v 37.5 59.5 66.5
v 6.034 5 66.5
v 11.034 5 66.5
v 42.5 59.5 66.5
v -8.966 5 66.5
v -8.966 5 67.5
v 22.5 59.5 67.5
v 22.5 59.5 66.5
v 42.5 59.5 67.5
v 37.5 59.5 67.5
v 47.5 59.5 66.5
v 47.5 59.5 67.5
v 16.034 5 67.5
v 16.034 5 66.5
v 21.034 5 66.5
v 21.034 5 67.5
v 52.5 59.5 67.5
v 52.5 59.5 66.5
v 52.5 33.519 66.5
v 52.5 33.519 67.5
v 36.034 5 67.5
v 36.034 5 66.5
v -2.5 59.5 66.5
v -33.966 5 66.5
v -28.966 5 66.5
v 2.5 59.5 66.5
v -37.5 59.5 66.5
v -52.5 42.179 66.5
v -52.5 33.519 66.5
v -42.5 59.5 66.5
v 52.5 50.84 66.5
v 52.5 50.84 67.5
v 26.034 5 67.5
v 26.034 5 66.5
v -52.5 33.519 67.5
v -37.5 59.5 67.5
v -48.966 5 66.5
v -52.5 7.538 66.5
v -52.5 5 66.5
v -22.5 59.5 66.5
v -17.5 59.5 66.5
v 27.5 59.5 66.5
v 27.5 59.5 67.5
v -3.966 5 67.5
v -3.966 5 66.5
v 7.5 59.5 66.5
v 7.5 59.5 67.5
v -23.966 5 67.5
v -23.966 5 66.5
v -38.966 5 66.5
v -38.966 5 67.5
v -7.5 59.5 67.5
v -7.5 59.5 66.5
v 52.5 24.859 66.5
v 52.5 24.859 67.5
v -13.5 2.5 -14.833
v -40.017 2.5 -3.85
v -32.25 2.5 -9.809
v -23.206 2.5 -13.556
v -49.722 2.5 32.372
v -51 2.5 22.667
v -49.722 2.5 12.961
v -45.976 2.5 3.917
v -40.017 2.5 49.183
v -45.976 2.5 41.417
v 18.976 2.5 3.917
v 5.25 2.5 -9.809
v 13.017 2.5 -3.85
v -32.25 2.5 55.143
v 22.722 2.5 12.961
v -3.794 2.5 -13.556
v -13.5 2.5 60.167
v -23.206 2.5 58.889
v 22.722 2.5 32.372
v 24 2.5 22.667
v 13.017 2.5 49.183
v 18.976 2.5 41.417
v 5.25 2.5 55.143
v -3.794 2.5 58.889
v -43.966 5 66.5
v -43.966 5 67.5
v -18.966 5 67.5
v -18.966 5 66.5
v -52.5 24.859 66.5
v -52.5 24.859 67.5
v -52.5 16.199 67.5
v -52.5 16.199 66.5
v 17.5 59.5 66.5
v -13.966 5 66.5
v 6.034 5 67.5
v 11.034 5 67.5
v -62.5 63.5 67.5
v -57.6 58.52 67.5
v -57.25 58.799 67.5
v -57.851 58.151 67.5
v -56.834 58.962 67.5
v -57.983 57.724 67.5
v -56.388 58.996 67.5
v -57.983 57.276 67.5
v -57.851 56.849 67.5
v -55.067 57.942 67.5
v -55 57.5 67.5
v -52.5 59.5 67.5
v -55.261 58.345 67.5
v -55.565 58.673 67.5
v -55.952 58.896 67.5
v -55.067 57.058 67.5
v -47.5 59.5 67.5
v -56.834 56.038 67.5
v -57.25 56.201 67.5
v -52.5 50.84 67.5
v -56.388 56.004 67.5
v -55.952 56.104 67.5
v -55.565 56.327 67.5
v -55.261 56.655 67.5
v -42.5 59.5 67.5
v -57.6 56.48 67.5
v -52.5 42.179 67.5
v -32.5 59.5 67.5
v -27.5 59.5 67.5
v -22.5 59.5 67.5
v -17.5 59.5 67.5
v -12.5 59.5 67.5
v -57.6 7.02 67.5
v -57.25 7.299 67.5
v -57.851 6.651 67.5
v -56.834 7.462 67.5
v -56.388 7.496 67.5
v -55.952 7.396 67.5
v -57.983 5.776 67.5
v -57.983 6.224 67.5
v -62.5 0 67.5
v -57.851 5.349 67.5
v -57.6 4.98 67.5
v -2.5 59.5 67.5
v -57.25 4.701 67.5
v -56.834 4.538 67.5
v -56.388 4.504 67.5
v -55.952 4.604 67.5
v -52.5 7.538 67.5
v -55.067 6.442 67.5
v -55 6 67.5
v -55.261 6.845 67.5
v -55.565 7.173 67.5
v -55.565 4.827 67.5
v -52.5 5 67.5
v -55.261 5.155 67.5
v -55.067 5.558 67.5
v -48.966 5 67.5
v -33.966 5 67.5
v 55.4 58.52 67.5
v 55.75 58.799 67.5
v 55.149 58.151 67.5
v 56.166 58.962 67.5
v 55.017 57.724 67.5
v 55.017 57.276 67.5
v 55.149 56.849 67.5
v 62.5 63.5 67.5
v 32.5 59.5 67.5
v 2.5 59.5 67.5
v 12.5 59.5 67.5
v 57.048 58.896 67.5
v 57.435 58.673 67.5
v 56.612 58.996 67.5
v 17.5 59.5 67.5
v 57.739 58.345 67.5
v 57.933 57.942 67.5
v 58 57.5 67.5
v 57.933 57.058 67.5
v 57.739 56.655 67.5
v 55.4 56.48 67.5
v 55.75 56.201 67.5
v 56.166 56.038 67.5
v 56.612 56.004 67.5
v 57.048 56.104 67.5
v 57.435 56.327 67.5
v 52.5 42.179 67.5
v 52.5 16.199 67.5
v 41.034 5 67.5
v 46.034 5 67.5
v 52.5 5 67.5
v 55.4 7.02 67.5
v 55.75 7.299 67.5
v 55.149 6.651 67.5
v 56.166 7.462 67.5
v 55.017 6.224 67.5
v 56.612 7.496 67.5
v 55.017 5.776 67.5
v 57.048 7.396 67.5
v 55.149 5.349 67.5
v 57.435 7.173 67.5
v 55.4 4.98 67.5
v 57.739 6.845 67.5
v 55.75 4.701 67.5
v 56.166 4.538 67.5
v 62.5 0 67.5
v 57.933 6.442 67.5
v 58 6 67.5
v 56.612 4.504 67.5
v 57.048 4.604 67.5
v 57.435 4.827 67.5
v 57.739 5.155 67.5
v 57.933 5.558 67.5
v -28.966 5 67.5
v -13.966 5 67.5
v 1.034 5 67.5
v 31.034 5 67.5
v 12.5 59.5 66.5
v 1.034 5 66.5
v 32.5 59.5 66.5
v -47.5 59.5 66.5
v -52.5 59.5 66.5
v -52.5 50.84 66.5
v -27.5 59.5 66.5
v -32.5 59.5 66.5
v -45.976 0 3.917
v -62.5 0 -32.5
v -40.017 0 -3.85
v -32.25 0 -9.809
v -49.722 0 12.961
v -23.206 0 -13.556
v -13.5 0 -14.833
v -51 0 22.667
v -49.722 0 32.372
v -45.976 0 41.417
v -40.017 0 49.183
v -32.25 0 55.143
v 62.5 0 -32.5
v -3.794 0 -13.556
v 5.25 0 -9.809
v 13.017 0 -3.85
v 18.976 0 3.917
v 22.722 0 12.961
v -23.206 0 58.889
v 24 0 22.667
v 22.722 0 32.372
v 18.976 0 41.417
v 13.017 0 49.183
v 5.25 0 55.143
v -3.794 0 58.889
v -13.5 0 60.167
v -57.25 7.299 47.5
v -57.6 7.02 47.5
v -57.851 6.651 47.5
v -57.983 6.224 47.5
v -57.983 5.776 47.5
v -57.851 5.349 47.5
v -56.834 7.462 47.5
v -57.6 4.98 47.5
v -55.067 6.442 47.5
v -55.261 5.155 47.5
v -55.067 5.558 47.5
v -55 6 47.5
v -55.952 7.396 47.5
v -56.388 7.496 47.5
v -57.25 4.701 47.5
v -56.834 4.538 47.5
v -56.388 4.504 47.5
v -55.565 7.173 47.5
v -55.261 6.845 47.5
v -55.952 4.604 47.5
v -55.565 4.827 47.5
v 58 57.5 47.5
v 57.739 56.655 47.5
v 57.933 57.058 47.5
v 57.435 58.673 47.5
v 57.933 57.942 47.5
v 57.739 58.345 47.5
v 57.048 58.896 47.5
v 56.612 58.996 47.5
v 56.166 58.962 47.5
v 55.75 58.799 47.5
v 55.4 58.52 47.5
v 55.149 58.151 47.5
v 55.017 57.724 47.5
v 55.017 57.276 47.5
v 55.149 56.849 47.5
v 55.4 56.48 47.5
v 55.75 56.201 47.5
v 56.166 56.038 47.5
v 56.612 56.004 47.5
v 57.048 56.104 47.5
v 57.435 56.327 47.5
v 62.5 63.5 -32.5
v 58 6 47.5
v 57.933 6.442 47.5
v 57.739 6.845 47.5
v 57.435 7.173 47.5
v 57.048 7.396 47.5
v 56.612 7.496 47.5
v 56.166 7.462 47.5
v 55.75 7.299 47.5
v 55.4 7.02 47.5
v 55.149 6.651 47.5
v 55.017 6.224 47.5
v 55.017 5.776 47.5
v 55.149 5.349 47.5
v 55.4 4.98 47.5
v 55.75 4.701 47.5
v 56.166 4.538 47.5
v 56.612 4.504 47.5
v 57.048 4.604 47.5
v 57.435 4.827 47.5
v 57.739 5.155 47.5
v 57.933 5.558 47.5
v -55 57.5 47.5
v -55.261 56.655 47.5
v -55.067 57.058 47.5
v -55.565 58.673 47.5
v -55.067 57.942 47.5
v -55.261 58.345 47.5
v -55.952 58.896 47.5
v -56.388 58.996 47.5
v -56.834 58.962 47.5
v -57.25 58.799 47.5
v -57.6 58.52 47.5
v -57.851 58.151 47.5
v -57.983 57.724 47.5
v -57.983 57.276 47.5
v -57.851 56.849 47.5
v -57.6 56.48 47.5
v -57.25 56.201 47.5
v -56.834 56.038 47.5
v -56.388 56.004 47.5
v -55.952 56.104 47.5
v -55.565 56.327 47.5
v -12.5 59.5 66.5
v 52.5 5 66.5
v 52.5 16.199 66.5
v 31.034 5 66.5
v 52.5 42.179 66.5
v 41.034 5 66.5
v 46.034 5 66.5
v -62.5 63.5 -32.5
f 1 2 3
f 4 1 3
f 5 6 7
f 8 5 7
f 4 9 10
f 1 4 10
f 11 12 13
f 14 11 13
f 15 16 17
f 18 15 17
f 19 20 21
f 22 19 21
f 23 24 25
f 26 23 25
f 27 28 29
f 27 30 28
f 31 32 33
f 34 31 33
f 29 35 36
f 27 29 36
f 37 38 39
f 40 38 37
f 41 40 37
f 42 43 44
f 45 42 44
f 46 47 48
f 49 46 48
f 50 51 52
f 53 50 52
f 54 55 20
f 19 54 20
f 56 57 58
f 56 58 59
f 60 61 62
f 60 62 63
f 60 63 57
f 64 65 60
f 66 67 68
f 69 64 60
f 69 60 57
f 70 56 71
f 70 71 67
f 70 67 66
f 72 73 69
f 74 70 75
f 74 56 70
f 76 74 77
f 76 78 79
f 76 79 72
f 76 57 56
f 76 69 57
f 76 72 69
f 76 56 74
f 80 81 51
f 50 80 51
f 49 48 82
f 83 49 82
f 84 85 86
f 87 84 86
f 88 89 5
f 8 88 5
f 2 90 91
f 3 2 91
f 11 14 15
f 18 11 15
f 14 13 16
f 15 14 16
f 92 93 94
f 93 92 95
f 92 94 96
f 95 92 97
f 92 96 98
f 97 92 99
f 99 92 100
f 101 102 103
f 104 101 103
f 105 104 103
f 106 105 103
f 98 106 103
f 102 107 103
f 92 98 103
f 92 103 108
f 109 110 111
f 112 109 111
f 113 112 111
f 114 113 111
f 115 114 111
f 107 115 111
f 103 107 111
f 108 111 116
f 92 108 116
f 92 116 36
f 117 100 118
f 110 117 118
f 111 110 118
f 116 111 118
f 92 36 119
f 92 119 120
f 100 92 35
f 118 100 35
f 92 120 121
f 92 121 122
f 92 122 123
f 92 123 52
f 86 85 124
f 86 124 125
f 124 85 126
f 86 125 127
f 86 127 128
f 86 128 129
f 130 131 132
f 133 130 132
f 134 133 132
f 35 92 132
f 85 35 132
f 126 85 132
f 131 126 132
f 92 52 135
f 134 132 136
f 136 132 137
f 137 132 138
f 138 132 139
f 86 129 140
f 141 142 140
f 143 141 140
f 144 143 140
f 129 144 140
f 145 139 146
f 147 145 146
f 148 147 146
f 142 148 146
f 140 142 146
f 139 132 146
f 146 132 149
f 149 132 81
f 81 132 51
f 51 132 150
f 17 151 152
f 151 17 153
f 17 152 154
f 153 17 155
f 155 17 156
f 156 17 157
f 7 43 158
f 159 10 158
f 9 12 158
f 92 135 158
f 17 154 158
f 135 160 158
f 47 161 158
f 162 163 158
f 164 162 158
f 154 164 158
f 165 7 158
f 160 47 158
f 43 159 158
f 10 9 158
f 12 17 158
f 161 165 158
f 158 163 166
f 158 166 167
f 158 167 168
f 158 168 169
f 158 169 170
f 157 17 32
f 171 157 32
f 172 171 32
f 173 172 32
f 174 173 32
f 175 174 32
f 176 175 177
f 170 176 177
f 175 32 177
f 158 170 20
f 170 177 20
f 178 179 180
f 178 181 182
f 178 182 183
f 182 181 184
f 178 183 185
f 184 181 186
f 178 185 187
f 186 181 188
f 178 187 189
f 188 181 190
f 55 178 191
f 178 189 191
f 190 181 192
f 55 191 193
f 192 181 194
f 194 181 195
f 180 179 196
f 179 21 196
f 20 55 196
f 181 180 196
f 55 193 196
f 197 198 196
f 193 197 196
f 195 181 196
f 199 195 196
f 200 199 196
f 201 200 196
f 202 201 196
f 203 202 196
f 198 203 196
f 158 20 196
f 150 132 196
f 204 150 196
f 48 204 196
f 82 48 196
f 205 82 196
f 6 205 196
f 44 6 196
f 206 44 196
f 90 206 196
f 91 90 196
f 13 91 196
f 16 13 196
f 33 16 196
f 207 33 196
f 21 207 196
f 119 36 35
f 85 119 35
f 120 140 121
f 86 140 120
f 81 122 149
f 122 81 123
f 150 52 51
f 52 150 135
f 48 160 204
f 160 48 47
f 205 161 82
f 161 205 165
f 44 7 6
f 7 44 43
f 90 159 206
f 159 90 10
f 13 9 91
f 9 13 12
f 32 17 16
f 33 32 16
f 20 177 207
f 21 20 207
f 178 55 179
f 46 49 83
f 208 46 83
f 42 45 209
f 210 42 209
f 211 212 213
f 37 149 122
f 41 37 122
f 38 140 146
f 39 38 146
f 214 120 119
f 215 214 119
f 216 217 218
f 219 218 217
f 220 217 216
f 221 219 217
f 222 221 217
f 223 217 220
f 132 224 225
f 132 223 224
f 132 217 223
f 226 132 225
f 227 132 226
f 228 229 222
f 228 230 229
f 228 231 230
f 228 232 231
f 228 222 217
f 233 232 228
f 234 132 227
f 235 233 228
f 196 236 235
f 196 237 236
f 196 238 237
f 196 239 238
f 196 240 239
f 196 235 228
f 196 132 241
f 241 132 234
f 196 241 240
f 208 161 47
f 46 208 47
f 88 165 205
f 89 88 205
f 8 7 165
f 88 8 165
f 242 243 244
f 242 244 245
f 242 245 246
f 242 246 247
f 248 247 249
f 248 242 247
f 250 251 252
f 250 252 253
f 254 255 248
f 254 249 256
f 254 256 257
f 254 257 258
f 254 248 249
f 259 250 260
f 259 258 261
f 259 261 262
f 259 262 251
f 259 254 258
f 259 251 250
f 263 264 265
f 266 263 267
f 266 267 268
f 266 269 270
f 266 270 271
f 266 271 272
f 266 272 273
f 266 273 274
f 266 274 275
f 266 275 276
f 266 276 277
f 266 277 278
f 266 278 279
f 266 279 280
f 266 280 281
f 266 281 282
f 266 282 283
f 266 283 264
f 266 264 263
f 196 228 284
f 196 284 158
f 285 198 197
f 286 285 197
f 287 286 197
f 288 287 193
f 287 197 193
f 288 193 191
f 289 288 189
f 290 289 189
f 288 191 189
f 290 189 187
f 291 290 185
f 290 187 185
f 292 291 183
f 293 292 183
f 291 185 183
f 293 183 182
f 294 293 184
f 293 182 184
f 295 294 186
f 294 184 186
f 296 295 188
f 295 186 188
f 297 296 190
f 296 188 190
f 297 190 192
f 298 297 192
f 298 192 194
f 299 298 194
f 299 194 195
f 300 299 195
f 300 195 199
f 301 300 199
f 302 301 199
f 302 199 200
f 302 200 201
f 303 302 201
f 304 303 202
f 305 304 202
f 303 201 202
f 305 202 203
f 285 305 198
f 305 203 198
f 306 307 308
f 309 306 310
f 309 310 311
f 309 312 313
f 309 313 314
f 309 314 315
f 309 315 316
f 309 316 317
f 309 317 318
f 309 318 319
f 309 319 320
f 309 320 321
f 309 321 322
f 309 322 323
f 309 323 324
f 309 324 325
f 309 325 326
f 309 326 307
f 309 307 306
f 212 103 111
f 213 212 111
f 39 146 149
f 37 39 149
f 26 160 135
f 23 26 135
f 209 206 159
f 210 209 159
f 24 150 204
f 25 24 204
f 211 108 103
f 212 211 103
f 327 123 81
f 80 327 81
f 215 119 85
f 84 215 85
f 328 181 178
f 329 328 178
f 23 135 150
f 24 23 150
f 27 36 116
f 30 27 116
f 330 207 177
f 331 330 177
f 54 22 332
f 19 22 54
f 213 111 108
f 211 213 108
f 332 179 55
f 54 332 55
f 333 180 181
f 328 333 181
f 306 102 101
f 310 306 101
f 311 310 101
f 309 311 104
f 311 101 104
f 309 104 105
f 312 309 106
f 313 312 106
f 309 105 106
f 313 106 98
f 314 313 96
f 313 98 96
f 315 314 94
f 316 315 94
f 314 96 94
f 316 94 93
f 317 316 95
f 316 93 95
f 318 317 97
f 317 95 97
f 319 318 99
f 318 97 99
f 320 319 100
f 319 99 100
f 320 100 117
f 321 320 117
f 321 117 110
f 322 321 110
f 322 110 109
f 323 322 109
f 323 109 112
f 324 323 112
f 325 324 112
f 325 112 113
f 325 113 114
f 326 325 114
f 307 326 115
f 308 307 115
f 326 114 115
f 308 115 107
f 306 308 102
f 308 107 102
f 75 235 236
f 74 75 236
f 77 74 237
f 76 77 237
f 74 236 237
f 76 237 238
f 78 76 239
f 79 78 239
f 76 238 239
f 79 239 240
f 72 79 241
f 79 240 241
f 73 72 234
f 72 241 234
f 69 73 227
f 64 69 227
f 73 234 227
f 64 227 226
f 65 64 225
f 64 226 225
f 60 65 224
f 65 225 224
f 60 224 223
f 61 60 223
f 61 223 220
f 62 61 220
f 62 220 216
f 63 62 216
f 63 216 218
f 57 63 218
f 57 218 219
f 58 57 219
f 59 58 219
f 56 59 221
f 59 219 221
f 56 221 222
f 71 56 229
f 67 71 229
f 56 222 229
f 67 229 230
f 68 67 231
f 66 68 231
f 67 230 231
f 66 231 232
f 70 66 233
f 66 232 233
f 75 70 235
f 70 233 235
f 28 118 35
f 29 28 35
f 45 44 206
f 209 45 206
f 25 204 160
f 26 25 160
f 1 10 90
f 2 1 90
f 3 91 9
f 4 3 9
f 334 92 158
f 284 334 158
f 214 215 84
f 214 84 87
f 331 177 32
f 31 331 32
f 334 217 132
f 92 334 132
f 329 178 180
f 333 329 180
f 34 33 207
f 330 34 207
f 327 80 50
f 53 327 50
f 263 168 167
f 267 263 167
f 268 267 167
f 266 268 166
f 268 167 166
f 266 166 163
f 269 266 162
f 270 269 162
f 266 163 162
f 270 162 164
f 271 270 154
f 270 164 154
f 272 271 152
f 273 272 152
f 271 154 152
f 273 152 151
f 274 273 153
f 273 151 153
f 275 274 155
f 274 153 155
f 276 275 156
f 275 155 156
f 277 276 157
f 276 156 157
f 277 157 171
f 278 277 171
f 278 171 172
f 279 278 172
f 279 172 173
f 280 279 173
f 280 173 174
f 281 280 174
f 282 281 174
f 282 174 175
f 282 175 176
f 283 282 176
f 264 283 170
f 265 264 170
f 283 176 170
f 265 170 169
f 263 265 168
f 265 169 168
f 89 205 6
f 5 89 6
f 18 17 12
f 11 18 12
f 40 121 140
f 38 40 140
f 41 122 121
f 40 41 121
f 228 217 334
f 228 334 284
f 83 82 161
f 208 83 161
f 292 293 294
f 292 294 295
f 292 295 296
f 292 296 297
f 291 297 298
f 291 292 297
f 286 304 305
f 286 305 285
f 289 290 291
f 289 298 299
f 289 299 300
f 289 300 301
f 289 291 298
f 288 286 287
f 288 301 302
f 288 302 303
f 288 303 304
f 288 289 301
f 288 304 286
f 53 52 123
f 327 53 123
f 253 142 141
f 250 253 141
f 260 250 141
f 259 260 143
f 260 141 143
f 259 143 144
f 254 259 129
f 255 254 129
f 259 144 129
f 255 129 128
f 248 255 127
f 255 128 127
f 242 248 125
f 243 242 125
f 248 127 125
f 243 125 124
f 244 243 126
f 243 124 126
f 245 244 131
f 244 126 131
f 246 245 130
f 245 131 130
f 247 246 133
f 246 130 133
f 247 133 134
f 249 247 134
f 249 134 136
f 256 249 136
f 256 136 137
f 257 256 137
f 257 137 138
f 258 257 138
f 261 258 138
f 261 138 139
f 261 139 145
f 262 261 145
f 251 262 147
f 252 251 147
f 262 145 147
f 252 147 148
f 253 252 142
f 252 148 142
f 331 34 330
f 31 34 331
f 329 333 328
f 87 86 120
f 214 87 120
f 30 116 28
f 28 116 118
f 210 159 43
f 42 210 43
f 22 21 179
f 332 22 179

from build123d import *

# Parameters (mm, degrees)
F0_W     = 125
F0_H     = 100
F2_DEPTH = 63.5
F1_R     = 37.5
F3_DEPTH = 2.5
F5_DEPTH = 1
F6_R     = 1.5
F7_DEPTH = 20


# Not quite as in the source:
# - a feature names something its author has since deleted; it is built from what else it names


with BuildPart() as f2:
    # F0 (on Front) → F2 (new body)
    with BuildSketch(Plane.XZ):
        with Locations((0, 17.5)):
            Rectangle(F0_W, F0_H)
    extrude(amount=-F2_DEPTH)

    # F1 (on Front) → F3 (cut, symmetric)
    with BuildSketch(Plane.XZ):
        with Locations((-13.5, 22.6666666667)):
            Circle(F1_R)
    extrude(amount=F3_DEPTH, both=True, mode=Mode.SUBTRACT)

    # F4 (on face) → F5 (cut)
    with BuildSketch(Plane.XY.offset(67.5)):
        Polygon((51.0344103292, 5), (52.5, 5), (52.5, 7.5384757729), align=None)
        Polygon((46.0344103292, 5), (51.0344103292, 5), (52.5, 7.5384757729), (52.5, 16.1987298108), align=None)
        Polygon((36.0344103292, 5), (41.0344103292, 5), (52.5, 24.8589838486), (52.5, 33.5192378865), align=None)
        Polygon((26.0344103292, 5), (31.0344103292, 5), (52.5, 42.1794919243), (52.5, 50.8397459622), align=None)
        Polygon((16.0344103292, 5), (21.0344103292, 5), (52.5, 59.5), (47.5, 59.5), align=None)
        Polygon((-32.5, 59.5), (-52.5, 24.8589838486), (-52.5, 16.1987298108), (-27.5, 59.5), align=None)
        Polygon((6.0344103292, 5), (11.0344103292, 5), (42.5, 59.5), (37.5, 59.5), align=None)
        Polygon((-52.5, 42.1794919243), (-52.5, 33.5192378865), (-37.5, 59.5), (-42.5, 59.5), align=None)
        Polygon((-47.5, 59.5), (-52.5, 59.5), (-52.5, 50.8397459622), align=None)
        Polygon((-22.5, 59.5), (-52.5, 7.5384757729), (-52.5, 5), (-48.9655896708, 5), (-17.5, 59.5), align=None)
        Polygon((-3.9655896708, 5), (1.0344103292, 5), (32.5, 59.5), (27.5, 59.5), align=None)
        Polygon((-13.9655896708, 5), (-8.9655896708, 5), (22.5, 59.5), (17.5, 59.5), align=None)
        Polygon((-12.5, 59.5), (-43.9655896708, 5), (-38.9655896708, 5), (-7.5, 59.5), align=None)
        Polygon((-23.9655896708, 5), (-18.9655896708, 5), (12.5, 59.5), (7.5, 59.5), align=None)
        Polygon((-2.5, 59.5), (-33.9655896708, 5), (-28.9655896708, 5), (2.5, 59.5), align=None)
    extrude(amount=-F5_DEPTH, mode=Mode.SUBTRACT)

    # F6 (on face) → F7 (cut)
    with BuildSketch(Plane.XY.offset(67.5)):
        with Locations((-56.5, 57.5)):
            Circle(F6_R)
        with Locations((56.5, 57.5)):
            Circle(F6_R)
        with Locations((56.5, 6)):
            Circle(F6_R)
        with Locations((-56.5, 6)):
            Circle(F6_R)
    extrude(amount=-F7_DEPTH, mode=Mode.SUBTRACT)


solid = f2.part
